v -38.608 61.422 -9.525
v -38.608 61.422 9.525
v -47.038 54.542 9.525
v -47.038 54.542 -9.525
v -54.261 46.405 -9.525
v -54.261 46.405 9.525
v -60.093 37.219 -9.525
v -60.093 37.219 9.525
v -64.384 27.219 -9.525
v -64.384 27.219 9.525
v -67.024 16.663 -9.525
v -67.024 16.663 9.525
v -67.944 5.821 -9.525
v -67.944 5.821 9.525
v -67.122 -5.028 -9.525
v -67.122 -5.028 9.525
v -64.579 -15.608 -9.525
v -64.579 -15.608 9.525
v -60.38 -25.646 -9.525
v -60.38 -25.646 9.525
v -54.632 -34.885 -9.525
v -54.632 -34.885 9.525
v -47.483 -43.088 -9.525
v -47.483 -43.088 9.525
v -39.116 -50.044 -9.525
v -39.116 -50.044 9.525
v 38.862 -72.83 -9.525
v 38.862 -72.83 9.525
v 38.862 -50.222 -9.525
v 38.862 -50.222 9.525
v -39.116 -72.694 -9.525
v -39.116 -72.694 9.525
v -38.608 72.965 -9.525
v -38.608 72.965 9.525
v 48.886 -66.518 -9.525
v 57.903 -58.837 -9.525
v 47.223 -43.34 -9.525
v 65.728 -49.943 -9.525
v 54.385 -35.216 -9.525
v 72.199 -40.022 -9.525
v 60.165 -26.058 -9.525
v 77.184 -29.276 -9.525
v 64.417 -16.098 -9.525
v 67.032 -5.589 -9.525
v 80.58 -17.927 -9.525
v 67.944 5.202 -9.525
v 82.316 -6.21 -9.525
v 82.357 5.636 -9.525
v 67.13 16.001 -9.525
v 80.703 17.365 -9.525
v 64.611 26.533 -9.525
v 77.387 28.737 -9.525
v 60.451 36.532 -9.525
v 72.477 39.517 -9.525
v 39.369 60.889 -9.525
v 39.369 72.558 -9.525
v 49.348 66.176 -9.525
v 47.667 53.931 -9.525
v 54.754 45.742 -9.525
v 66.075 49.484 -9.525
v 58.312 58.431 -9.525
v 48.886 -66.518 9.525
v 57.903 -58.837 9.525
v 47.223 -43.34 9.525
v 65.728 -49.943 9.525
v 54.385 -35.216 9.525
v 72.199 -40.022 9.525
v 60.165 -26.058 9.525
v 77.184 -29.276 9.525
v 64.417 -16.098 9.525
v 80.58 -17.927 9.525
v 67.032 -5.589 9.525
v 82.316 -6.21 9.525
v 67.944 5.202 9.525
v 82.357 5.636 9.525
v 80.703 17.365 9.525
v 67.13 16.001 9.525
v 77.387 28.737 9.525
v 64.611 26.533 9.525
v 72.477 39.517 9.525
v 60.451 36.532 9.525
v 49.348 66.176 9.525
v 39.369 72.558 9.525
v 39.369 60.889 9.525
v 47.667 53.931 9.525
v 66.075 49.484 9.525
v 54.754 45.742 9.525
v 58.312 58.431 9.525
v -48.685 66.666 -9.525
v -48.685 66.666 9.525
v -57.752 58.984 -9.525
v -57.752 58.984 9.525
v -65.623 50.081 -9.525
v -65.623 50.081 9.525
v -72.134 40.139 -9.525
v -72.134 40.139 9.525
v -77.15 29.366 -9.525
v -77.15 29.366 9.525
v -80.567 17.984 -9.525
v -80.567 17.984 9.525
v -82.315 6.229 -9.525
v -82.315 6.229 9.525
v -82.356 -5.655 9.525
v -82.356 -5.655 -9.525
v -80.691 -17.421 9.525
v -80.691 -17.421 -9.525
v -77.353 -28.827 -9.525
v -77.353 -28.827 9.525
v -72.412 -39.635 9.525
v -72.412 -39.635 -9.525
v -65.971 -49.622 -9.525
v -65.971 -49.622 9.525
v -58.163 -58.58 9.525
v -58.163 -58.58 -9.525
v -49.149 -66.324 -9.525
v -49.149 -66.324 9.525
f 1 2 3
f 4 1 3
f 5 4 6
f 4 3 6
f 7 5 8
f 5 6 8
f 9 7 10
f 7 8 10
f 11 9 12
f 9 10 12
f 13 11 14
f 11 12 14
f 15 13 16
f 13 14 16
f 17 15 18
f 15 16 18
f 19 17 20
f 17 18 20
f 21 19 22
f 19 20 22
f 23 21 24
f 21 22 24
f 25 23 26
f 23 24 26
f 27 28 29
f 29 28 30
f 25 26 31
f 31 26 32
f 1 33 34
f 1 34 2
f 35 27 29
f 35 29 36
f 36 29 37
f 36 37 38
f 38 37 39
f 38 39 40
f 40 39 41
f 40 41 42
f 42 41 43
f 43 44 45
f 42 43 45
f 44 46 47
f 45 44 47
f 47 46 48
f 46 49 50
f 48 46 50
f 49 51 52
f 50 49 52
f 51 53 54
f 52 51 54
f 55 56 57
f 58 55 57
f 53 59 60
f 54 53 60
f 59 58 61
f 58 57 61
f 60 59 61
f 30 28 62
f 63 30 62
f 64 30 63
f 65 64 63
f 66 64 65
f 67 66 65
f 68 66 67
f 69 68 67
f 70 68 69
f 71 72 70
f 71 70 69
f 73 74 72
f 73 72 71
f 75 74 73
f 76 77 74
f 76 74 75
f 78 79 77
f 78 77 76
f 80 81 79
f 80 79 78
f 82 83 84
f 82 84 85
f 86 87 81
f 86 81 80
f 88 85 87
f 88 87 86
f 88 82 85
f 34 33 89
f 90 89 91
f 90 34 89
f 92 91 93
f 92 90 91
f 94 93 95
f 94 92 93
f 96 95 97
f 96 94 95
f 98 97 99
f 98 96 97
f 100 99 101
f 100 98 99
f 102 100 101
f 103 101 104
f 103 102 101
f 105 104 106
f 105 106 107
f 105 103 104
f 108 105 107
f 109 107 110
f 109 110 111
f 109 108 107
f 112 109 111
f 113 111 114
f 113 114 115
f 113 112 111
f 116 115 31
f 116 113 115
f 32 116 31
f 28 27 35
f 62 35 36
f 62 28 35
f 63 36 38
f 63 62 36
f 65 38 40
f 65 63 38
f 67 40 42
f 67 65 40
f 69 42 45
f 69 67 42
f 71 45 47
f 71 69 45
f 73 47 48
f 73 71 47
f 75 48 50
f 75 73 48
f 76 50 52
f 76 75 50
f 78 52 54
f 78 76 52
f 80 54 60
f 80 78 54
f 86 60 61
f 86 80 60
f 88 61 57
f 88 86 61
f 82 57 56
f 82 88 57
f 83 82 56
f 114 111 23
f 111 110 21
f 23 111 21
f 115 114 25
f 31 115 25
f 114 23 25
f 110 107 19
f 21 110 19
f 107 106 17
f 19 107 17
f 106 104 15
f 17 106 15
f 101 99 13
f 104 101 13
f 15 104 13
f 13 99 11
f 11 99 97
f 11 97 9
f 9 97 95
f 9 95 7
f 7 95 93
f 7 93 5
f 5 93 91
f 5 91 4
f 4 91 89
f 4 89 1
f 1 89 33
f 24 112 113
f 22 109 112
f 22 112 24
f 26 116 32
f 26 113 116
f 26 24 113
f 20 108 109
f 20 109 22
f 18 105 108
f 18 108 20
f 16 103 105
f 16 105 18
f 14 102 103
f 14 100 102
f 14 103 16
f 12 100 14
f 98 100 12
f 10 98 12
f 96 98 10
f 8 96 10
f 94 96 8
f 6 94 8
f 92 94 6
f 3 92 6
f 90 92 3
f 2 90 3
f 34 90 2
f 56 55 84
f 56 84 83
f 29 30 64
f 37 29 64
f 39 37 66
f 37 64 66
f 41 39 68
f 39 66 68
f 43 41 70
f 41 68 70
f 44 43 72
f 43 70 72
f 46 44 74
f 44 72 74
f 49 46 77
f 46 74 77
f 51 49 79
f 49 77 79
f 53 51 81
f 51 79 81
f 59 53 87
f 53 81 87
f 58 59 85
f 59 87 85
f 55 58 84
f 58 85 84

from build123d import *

# Parameters (mm, degrees)
F0_R     = 82.55
F1_DEPTH = 9.525
F2_W     = 24.13
F2_H     = 99.441
F3_DEPTH = 9.525
F4_R     = 67.945
F5_DEPTH = 19.05
F7_DEPTH = 9.525
F9_DEPTH = 22.225


with BuildPart() as f1:
    # F0 (on Top) → F1 (new body, symmetric)
    with BuildSketch(Plane.XY):
        Circle(F0_R)
    extrude(amount=F1_DEPTH, both=True)

    # F2 (on Top) → F3 (cut, symmetric)
    with BuildSketch(Plane.XY):
        with Locations((9.92e-08, -32.9009743614)):
            Rectangle(F2_W, F2_H)
    extrude(amount=F3_DEPTH, both=True, mode=Mode.SUBTRACT)

    # F4 (on face) → F5 (cut)
    with BuildSketch(Plane.XY.offset(9.525)):
        with Locations((0, 5.5118)):
            Circle(F4_R)
    extrude(amount=-F5_DEPTH, mode=Mode.SUBTRACT)

    # F6 (on Top) → F7 (cut, symmetric)
    with BuildSketch(Plane.XY):
        Polygon((38.8619990952, -40.2722091794), (-5.8420009048, -40.2722091794), (-39.1160009048, -40.2722091794), (-39.1160009048, -91.0722091794), (38.8619990952, -91.0722091794), align=None)
    extrude(amount=F7_DEPTH, both=True, mode=Mode.SUBTRACT)

    # F8 (on Top) → F9 (cut, symmetric)
    with BuildSketch(Plane.XY):
        Polygon((39.3687439047, 102.805023804), (6.0959986031, 102.5160668969), (-38.6080013969, 102.5160668969), (-38.6080013969, 51.7160668969), (6.0959986031, 51.7160668969), (39.3687439047, 51.7160668969), align=None)
    extrude(amount=F9_DEPTH, both=True, mode=Mode.SUBTRACT)


solid = f1.part
